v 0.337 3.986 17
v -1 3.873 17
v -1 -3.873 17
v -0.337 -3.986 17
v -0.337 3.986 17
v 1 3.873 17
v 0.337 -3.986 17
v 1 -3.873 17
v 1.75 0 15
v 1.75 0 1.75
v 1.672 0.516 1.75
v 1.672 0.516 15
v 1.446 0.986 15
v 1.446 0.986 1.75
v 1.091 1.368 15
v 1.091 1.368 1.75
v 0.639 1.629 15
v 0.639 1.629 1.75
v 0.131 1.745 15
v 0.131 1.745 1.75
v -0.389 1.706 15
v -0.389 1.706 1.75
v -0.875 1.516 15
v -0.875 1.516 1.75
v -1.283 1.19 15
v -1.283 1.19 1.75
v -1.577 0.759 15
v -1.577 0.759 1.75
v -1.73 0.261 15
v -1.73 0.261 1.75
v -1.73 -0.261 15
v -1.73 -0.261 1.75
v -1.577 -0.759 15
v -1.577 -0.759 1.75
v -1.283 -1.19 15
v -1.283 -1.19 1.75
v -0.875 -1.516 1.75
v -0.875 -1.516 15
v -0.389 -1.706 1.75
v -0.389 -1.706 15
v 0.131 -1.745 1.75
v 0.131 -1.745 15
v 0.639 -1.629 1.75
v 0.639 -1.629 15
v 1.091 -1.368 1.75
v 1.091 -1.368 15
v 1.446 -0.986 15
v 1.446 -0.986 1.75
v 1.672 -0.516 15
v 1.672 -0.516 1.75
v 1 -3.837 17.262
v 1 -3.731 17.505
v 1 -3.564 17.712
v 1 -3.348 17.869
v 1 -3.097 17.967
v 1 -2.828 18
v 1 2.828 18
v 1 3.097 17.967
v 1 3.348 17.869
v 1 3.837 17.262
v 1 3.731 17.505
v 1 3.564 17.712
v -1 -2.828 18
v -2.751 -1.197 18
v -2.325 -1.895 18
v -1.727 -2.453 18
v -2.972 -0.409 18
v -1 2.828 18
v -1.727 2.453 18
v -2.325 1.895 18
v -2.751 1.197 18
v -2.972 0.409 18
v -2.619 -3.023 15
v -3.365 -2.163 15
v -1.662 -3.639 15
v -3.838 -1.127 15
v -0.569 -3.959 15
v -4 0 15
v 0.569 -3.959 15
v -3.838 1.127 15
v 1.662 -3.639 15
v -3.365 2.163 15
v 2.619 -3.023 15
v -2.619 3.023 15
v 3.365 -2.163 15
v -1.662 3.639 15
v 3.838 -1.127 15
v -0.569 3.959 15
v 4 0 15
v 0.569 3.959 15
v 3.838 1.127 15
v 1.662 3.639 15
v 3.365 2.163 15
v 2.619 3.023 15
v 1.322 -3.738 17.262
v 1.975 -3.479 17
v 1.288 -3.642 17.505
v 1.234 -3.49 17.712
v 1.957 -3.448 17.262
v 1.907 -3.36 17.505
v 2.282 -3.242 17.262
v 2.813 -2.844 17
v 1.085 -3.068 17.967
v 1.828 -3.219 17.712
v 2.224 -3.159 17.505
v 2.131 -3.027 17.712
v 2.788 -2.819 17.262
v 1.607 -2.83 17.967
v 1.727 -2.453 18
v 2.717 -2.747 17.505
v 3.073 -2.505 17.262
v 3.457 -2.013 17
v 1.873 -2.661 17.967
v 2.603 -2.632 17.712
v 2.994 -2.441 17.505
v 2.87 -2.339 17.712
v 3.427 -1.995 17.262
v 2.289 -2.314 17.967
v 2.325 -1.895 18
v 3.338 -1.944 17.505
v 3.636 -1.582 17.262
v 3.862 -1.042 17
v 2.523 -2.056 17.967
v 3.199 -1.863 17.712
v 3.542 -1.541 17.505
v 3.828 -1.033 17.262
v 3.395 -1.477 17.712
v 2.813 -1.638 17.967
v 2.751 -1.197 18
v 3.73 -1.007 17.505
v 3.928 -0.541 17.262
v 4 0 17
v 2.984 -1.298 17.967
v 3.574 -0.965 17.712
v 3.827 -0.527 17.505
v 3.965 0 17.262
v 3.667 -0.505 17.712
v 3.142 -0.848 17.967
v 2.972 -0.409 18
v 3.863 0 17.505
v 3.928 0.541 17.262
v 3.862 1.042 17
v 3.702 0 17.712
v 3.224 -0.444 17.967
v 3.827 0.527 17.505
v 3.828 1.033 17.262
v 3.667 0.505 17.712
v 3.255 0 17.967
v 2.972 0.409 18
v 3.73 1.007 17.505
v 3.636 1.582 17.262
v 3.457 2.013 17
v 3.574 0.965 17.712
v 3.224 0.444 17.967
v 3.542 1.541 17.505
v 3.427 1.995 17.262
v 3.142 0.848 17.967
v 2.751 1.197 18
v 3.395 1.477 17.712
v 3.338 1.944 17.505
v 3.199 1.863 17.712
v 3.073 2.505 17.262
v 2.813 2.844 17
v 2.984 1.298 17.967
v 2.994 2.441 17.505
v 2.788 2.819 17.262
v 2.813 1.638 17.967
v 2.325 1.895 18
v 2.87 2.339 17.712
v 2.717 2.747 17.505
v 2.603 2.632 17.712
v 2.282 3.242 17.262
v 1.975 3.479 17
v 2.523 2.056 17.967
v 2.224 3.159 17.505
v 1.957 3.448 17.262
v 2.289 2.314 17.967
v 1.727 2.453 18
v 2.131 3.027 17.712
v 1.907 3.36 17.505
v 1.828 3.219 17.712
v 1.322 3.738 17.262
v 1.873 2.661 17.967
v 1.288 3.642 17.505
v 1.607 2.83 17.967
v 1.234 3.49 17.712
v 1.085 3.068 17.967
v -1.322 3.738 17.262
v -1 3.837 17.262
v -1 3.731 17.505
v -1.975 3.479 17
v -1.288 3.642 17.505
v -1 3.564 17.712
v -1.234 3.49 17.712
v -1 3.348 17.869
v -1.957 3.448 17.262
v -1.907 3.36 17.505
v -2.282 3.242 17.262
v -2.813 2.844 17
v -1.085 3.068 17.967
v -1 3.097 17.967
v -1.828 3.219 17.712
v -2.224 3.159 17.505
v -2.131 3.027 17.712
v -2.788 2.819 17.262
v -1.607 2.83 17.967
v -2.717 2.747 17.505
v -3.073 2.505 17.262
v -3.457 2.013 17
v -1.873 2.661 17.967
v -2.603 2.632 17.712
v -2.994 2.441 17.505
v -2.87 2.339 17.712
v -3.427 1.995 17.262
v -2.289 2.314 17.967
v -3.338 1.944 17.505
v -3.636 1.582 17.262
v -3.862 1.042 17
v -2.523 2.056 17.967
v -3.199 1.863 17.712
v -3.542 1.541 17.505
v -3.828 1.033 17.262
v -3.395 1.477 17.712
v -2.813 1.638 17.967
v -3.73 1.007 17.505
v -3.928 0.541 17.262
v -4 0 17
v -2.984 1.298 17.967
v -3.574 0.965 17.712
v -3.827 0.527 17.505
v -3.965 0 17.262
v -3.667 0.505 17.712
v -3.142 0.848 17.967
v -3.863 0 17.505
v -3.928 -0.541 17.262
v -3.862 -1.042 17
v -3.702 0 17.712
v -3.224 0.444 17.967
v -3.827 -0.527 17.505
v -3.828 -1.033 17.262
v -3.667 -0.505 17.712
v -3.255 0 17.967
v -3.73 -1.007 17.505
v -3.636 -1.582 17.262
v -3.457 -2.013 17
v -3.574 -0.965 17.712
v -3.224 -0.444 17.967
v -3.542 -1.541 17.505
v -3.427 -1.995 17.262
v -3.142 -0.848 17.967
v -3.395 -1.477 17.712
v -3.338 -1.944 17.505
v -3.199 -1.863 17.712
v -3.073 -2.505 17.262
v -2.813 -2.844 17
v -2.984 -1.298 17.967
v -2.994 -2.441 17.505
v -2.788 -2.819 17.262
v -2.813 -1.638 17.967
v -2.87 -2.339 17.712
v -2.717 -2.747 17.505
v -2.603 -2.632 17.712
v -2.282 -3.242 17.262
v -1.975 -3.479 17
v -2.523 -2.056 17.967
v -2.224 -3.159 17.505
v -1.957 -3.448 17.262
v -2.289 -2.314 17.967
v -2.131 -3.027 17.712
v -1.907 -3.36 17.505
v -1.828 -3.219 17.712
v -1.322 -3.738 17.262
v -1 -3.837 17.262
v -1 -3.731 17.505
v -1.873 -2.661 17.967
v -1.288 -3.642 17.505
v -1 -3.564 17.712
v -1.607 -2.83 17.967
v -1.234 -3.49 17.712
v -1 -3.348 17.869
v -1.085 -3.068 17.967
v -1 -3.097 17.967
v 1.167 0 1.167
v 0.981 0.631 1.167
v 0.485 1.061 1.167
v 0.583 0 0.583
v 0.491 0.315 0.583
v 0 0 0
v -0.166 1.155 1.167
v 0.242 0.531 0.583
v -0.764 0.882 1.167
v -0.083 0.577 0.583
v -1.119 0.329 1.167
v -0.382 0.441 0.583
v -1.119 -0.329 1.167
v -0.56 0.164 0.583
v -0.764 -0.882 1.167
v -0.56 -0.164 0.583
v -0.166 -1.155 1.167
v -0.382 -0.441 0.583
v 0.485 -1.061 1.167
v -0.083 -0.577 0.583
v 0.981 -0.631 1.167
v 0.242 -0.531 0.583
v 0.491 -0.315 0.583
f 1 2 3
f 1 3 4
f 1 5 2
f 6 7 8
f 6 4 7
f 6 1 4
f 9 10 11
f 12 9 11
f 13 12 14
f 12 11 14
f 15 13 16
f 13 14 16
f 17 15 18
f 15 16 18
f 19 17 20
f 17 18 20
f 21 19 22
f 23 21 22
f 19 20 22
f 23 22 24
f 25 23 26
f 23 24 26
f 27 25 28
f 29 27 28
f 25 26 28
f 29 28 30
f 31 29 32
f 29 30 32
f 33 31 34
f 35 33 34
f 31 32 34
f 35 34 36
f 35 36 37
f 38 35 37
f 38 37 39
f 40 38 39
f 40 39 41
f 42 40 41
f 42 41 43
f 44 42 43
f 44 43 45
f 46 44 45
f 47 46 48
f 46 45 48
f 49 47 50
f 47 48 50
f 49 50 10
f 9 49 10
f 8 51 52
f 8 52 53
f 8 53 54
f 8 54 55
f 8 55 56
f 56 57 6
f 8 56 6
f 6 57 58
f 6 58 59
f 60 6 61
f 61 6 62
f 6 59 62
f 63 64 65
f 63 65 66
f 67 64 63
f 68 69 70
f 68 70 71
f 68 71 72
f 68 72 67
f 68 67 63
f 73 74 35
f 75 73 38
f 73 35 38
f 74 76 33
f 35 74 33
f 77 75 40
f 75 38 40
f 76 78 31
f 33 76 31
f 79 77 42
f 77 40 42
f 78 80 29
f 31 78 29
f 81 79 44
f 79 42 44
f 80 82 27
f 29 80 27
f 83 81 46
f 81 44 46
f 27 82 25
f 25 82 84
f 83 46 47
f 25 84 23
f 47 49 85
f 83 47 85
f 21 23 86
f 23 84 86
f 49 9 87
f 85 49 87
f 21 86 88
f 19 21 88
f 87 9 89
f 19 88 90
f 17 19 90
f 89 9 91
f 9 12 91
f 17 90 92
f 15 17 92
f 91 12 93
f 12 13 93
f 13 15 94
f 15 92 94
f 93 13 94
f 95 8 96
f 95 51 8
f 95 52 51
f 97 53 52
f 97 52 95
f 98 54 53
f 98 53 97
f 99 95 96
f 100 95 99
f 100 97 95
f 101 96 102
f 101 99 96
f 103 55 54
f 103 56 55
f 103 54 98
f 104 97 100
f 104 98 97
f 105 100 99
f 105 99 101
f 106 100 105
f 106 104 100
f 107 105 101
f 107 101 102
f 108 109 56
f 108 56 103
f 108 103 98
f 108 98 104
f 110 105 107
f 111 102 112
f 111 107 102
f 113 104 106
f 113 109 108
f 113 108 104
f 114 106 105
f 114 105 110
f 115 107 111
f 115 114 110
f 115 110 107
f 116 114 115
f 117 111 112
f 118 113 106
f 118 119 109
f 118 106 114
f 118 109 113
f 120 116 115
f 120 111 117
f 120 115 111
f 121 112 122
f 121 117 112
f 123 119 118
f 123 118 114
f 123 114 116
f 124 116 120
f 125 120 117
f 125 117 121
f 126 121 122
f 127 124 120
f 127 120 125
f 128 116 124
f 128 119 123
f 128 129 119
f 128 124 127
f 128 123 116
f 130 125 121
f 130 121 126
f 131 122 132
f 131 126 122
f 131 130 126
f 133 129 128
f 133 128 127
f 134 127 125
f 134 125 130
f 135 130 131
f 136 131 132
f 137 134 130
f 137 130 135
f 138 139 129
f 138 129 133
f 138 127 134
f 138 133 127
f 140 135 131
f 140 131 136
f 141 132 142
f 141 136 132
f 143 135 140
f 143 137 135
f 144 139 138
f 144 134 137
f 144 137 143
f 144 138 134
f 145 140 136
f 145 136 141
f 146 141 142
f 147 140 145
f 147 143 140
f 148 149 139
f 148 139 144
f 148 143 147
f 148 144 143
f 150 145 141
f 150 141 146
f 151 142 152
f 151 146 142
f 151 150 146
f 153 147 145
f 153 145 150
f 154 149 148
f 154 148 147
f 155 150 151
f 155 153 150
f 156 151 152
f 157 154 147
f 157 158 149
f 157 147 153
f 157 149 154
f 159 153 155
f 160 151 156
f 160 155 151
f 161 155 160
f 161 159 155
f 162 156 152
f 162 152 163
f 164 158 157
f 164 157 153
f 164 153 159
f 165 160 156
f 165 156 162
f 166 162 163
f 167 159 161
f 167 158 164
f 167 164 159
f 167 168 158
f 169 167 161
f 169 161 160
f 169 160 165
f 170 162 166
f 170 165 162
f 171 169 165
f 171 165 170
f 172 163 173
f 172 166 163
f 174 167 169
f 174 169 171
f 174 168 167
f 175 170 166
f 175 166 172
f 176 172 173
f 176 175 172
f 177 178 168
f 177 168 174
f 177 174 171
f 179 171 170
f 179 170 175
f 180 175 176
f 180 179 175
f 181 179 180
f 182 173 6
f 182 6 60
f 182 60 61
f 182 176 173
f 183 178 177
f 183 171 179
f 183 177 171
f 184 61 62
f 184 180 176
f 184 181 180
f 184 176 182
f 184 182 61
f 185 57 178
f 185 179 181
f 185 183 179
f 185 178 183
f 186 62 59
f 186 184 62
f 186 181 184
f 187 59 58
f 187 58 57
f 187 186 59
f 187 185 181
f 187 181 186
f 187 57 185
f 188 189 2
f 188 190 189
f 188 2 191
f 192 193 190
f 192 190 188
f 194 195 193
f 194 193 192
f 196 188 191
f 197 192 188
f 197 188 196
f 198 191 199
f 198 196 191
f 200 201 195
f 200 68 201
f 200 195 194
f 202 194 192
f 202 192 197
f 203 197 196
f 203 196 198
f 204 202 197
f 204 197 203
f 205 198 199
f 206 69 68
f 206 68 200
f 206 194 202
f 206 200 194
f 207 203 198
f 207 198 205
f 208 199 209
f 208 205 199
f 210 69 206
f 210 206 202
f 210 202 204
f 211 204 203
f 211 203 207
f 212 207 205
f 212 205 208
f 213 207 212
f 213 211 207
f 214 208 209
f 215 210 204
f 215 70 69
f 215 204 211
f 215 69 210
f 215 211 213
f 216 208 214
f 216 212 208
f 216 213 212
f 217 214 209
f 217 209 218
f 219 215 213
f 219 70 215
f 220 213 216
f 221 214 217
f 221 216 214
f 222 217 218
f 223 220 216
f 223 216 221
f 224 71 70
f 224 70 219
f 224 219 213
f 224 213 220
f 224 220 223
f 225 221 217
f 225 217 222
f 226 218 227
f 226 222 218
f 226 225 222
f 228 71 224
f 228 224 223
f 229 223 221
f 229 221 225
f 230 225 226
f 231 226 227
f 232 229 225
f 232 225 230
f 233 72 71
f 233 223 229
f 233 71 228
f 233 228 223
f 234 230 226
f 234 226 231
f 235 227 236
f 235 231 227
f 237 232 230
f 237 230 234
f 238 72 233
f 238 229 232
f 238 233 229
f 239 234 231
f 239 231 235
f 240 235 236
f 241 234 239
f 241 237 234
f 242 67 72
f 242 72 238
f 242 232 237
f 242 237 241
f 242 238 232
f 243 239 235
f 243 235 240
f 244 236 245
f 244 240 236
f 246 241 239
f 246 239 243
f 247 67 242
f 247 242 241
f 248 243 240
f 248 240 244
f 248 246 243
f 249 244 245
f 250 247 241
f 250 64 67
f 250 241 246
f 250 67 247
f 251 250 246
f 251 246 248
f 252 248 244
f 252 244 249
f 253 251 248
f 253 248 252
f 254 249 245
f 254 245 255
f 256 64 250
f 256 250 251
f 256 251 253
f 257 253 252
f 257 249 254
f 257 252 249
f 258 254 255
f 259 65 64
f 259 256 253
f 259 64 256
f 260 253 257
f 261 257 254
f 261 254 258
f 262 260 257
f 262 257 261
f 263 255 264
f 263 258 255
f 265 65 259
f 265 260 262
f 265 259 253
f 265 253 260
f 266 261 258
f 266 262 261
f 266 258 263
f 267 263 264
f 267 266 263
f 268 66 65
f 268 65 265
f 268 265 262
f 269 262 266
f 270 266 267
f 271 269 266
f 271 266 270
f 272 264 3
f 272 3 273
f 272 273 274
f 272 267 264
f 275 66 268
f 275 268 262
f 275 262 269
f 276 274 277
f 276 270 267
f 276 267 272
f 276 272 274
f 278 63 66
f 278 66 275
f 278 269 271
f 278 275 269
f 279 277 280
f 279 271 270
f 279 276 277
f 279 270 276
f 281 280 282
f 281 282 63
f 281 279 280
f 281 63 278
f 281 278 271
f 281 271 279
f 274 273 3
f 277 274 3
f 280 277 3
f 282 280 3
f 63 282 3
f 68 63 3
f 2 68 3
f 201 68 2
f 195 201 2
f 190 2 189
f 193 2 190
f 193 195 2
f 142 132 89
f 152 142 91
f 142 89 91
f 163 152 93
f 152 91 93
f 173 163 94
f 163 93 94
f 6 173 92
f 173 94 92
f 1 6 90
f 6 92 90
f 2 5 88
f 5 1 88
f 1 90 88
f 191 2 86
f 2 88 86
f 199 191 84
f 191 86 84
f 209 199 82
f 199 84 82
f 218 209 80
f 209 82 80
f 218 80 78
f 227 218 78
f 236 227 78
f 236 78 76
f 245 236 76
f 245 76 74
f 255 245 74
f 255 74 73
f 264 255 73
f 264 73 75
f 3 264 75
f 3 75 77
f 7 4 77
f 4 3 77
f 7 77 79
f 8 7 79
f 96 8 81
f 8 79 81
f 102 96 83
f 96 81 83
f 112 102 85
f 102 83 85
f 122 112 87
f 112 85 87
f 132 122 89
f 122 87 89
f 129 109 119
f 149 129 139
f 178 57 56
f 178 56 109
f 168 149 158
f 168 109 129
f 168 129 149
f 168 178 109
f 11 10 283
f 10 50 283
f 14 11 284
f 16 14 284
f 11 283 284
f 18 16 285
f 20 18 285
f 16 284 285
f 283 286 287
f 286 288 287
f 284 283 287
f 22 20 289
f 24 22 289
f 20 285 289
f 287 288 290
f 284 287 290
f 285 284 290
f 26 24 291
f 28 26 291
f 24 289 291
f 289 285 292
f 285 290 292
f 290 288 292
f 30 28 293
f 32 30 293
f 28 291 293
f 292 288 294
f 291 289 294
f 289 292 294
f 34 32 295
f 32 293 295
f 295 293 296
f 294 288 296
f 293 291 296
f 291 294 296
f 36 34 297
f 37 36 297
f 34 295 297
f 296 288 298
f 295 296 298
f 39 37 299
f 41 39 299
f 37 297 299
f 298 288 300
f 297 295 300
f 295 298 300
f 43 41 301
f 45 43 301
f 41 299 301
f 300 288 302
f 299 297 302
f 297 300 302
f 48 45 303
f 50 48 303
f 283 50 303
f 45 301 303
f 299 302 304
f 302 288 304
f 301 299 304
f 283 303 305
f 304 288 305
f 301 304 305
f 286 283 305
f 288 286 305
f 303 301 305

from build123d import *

# Parameters (mm, degrees)
SKICA1_R                 = 1.75
VYSUNOUT1_DEPTH          = 15
SKICA3_R                 = 4
VYSUNOUT2_DEPTH          = 3
ZAOBLIT1_R               = 1
ZKOSIT1_SIZE             = 1.75
SKICA8_W                 = 2
SKICA8_H                 = 8
ODEBRAT_VYSUNUT_M2_DEPTH = 1


with BuildPart() as part:
    # Skica1 → Vysunout1 (new body)
    with BuildSketch(Plane.XY):
        Circle(SKICA1_R)
    extrude(amount=VYSUNOUT1_DEPTH)

    # Skica3 → Vysunout2 (add)
    with BuildSketch(Plane.XY.offset(15)):
        Circle(SKICA3_R)
    extrude(amount=VYSUNOUT2_DEPTH)

    # Zaoblit1
    zaoblit1_edges = [part.edges().sort_by_distance(p)[0] for p in [
        (-4, 0, 18),
    ]]
    fillet(zaoblit1_edges, radius=ZAOBLIT1_R)

    # Zkosit1
    zkosit1_edges = [part.edges().sort_by_distance(p)[0] for p in [
        (-1.75, 0, 0),
    ]]
    chamfer(zkosit1_edges, length=ZKOSIT1_SIZE)

    # Skica8 → Odebrat vysunutím2 (cut)
    with BuildSketch(Plane.XY.offset(18)):
        Rectangle(SKICA8_W, SKICA8_H)
    extrude(amount=-ODEBRAT_VYSUNUT_M2_DEPTH, mode=Mode.SUBTRACT)


solid = part.part
